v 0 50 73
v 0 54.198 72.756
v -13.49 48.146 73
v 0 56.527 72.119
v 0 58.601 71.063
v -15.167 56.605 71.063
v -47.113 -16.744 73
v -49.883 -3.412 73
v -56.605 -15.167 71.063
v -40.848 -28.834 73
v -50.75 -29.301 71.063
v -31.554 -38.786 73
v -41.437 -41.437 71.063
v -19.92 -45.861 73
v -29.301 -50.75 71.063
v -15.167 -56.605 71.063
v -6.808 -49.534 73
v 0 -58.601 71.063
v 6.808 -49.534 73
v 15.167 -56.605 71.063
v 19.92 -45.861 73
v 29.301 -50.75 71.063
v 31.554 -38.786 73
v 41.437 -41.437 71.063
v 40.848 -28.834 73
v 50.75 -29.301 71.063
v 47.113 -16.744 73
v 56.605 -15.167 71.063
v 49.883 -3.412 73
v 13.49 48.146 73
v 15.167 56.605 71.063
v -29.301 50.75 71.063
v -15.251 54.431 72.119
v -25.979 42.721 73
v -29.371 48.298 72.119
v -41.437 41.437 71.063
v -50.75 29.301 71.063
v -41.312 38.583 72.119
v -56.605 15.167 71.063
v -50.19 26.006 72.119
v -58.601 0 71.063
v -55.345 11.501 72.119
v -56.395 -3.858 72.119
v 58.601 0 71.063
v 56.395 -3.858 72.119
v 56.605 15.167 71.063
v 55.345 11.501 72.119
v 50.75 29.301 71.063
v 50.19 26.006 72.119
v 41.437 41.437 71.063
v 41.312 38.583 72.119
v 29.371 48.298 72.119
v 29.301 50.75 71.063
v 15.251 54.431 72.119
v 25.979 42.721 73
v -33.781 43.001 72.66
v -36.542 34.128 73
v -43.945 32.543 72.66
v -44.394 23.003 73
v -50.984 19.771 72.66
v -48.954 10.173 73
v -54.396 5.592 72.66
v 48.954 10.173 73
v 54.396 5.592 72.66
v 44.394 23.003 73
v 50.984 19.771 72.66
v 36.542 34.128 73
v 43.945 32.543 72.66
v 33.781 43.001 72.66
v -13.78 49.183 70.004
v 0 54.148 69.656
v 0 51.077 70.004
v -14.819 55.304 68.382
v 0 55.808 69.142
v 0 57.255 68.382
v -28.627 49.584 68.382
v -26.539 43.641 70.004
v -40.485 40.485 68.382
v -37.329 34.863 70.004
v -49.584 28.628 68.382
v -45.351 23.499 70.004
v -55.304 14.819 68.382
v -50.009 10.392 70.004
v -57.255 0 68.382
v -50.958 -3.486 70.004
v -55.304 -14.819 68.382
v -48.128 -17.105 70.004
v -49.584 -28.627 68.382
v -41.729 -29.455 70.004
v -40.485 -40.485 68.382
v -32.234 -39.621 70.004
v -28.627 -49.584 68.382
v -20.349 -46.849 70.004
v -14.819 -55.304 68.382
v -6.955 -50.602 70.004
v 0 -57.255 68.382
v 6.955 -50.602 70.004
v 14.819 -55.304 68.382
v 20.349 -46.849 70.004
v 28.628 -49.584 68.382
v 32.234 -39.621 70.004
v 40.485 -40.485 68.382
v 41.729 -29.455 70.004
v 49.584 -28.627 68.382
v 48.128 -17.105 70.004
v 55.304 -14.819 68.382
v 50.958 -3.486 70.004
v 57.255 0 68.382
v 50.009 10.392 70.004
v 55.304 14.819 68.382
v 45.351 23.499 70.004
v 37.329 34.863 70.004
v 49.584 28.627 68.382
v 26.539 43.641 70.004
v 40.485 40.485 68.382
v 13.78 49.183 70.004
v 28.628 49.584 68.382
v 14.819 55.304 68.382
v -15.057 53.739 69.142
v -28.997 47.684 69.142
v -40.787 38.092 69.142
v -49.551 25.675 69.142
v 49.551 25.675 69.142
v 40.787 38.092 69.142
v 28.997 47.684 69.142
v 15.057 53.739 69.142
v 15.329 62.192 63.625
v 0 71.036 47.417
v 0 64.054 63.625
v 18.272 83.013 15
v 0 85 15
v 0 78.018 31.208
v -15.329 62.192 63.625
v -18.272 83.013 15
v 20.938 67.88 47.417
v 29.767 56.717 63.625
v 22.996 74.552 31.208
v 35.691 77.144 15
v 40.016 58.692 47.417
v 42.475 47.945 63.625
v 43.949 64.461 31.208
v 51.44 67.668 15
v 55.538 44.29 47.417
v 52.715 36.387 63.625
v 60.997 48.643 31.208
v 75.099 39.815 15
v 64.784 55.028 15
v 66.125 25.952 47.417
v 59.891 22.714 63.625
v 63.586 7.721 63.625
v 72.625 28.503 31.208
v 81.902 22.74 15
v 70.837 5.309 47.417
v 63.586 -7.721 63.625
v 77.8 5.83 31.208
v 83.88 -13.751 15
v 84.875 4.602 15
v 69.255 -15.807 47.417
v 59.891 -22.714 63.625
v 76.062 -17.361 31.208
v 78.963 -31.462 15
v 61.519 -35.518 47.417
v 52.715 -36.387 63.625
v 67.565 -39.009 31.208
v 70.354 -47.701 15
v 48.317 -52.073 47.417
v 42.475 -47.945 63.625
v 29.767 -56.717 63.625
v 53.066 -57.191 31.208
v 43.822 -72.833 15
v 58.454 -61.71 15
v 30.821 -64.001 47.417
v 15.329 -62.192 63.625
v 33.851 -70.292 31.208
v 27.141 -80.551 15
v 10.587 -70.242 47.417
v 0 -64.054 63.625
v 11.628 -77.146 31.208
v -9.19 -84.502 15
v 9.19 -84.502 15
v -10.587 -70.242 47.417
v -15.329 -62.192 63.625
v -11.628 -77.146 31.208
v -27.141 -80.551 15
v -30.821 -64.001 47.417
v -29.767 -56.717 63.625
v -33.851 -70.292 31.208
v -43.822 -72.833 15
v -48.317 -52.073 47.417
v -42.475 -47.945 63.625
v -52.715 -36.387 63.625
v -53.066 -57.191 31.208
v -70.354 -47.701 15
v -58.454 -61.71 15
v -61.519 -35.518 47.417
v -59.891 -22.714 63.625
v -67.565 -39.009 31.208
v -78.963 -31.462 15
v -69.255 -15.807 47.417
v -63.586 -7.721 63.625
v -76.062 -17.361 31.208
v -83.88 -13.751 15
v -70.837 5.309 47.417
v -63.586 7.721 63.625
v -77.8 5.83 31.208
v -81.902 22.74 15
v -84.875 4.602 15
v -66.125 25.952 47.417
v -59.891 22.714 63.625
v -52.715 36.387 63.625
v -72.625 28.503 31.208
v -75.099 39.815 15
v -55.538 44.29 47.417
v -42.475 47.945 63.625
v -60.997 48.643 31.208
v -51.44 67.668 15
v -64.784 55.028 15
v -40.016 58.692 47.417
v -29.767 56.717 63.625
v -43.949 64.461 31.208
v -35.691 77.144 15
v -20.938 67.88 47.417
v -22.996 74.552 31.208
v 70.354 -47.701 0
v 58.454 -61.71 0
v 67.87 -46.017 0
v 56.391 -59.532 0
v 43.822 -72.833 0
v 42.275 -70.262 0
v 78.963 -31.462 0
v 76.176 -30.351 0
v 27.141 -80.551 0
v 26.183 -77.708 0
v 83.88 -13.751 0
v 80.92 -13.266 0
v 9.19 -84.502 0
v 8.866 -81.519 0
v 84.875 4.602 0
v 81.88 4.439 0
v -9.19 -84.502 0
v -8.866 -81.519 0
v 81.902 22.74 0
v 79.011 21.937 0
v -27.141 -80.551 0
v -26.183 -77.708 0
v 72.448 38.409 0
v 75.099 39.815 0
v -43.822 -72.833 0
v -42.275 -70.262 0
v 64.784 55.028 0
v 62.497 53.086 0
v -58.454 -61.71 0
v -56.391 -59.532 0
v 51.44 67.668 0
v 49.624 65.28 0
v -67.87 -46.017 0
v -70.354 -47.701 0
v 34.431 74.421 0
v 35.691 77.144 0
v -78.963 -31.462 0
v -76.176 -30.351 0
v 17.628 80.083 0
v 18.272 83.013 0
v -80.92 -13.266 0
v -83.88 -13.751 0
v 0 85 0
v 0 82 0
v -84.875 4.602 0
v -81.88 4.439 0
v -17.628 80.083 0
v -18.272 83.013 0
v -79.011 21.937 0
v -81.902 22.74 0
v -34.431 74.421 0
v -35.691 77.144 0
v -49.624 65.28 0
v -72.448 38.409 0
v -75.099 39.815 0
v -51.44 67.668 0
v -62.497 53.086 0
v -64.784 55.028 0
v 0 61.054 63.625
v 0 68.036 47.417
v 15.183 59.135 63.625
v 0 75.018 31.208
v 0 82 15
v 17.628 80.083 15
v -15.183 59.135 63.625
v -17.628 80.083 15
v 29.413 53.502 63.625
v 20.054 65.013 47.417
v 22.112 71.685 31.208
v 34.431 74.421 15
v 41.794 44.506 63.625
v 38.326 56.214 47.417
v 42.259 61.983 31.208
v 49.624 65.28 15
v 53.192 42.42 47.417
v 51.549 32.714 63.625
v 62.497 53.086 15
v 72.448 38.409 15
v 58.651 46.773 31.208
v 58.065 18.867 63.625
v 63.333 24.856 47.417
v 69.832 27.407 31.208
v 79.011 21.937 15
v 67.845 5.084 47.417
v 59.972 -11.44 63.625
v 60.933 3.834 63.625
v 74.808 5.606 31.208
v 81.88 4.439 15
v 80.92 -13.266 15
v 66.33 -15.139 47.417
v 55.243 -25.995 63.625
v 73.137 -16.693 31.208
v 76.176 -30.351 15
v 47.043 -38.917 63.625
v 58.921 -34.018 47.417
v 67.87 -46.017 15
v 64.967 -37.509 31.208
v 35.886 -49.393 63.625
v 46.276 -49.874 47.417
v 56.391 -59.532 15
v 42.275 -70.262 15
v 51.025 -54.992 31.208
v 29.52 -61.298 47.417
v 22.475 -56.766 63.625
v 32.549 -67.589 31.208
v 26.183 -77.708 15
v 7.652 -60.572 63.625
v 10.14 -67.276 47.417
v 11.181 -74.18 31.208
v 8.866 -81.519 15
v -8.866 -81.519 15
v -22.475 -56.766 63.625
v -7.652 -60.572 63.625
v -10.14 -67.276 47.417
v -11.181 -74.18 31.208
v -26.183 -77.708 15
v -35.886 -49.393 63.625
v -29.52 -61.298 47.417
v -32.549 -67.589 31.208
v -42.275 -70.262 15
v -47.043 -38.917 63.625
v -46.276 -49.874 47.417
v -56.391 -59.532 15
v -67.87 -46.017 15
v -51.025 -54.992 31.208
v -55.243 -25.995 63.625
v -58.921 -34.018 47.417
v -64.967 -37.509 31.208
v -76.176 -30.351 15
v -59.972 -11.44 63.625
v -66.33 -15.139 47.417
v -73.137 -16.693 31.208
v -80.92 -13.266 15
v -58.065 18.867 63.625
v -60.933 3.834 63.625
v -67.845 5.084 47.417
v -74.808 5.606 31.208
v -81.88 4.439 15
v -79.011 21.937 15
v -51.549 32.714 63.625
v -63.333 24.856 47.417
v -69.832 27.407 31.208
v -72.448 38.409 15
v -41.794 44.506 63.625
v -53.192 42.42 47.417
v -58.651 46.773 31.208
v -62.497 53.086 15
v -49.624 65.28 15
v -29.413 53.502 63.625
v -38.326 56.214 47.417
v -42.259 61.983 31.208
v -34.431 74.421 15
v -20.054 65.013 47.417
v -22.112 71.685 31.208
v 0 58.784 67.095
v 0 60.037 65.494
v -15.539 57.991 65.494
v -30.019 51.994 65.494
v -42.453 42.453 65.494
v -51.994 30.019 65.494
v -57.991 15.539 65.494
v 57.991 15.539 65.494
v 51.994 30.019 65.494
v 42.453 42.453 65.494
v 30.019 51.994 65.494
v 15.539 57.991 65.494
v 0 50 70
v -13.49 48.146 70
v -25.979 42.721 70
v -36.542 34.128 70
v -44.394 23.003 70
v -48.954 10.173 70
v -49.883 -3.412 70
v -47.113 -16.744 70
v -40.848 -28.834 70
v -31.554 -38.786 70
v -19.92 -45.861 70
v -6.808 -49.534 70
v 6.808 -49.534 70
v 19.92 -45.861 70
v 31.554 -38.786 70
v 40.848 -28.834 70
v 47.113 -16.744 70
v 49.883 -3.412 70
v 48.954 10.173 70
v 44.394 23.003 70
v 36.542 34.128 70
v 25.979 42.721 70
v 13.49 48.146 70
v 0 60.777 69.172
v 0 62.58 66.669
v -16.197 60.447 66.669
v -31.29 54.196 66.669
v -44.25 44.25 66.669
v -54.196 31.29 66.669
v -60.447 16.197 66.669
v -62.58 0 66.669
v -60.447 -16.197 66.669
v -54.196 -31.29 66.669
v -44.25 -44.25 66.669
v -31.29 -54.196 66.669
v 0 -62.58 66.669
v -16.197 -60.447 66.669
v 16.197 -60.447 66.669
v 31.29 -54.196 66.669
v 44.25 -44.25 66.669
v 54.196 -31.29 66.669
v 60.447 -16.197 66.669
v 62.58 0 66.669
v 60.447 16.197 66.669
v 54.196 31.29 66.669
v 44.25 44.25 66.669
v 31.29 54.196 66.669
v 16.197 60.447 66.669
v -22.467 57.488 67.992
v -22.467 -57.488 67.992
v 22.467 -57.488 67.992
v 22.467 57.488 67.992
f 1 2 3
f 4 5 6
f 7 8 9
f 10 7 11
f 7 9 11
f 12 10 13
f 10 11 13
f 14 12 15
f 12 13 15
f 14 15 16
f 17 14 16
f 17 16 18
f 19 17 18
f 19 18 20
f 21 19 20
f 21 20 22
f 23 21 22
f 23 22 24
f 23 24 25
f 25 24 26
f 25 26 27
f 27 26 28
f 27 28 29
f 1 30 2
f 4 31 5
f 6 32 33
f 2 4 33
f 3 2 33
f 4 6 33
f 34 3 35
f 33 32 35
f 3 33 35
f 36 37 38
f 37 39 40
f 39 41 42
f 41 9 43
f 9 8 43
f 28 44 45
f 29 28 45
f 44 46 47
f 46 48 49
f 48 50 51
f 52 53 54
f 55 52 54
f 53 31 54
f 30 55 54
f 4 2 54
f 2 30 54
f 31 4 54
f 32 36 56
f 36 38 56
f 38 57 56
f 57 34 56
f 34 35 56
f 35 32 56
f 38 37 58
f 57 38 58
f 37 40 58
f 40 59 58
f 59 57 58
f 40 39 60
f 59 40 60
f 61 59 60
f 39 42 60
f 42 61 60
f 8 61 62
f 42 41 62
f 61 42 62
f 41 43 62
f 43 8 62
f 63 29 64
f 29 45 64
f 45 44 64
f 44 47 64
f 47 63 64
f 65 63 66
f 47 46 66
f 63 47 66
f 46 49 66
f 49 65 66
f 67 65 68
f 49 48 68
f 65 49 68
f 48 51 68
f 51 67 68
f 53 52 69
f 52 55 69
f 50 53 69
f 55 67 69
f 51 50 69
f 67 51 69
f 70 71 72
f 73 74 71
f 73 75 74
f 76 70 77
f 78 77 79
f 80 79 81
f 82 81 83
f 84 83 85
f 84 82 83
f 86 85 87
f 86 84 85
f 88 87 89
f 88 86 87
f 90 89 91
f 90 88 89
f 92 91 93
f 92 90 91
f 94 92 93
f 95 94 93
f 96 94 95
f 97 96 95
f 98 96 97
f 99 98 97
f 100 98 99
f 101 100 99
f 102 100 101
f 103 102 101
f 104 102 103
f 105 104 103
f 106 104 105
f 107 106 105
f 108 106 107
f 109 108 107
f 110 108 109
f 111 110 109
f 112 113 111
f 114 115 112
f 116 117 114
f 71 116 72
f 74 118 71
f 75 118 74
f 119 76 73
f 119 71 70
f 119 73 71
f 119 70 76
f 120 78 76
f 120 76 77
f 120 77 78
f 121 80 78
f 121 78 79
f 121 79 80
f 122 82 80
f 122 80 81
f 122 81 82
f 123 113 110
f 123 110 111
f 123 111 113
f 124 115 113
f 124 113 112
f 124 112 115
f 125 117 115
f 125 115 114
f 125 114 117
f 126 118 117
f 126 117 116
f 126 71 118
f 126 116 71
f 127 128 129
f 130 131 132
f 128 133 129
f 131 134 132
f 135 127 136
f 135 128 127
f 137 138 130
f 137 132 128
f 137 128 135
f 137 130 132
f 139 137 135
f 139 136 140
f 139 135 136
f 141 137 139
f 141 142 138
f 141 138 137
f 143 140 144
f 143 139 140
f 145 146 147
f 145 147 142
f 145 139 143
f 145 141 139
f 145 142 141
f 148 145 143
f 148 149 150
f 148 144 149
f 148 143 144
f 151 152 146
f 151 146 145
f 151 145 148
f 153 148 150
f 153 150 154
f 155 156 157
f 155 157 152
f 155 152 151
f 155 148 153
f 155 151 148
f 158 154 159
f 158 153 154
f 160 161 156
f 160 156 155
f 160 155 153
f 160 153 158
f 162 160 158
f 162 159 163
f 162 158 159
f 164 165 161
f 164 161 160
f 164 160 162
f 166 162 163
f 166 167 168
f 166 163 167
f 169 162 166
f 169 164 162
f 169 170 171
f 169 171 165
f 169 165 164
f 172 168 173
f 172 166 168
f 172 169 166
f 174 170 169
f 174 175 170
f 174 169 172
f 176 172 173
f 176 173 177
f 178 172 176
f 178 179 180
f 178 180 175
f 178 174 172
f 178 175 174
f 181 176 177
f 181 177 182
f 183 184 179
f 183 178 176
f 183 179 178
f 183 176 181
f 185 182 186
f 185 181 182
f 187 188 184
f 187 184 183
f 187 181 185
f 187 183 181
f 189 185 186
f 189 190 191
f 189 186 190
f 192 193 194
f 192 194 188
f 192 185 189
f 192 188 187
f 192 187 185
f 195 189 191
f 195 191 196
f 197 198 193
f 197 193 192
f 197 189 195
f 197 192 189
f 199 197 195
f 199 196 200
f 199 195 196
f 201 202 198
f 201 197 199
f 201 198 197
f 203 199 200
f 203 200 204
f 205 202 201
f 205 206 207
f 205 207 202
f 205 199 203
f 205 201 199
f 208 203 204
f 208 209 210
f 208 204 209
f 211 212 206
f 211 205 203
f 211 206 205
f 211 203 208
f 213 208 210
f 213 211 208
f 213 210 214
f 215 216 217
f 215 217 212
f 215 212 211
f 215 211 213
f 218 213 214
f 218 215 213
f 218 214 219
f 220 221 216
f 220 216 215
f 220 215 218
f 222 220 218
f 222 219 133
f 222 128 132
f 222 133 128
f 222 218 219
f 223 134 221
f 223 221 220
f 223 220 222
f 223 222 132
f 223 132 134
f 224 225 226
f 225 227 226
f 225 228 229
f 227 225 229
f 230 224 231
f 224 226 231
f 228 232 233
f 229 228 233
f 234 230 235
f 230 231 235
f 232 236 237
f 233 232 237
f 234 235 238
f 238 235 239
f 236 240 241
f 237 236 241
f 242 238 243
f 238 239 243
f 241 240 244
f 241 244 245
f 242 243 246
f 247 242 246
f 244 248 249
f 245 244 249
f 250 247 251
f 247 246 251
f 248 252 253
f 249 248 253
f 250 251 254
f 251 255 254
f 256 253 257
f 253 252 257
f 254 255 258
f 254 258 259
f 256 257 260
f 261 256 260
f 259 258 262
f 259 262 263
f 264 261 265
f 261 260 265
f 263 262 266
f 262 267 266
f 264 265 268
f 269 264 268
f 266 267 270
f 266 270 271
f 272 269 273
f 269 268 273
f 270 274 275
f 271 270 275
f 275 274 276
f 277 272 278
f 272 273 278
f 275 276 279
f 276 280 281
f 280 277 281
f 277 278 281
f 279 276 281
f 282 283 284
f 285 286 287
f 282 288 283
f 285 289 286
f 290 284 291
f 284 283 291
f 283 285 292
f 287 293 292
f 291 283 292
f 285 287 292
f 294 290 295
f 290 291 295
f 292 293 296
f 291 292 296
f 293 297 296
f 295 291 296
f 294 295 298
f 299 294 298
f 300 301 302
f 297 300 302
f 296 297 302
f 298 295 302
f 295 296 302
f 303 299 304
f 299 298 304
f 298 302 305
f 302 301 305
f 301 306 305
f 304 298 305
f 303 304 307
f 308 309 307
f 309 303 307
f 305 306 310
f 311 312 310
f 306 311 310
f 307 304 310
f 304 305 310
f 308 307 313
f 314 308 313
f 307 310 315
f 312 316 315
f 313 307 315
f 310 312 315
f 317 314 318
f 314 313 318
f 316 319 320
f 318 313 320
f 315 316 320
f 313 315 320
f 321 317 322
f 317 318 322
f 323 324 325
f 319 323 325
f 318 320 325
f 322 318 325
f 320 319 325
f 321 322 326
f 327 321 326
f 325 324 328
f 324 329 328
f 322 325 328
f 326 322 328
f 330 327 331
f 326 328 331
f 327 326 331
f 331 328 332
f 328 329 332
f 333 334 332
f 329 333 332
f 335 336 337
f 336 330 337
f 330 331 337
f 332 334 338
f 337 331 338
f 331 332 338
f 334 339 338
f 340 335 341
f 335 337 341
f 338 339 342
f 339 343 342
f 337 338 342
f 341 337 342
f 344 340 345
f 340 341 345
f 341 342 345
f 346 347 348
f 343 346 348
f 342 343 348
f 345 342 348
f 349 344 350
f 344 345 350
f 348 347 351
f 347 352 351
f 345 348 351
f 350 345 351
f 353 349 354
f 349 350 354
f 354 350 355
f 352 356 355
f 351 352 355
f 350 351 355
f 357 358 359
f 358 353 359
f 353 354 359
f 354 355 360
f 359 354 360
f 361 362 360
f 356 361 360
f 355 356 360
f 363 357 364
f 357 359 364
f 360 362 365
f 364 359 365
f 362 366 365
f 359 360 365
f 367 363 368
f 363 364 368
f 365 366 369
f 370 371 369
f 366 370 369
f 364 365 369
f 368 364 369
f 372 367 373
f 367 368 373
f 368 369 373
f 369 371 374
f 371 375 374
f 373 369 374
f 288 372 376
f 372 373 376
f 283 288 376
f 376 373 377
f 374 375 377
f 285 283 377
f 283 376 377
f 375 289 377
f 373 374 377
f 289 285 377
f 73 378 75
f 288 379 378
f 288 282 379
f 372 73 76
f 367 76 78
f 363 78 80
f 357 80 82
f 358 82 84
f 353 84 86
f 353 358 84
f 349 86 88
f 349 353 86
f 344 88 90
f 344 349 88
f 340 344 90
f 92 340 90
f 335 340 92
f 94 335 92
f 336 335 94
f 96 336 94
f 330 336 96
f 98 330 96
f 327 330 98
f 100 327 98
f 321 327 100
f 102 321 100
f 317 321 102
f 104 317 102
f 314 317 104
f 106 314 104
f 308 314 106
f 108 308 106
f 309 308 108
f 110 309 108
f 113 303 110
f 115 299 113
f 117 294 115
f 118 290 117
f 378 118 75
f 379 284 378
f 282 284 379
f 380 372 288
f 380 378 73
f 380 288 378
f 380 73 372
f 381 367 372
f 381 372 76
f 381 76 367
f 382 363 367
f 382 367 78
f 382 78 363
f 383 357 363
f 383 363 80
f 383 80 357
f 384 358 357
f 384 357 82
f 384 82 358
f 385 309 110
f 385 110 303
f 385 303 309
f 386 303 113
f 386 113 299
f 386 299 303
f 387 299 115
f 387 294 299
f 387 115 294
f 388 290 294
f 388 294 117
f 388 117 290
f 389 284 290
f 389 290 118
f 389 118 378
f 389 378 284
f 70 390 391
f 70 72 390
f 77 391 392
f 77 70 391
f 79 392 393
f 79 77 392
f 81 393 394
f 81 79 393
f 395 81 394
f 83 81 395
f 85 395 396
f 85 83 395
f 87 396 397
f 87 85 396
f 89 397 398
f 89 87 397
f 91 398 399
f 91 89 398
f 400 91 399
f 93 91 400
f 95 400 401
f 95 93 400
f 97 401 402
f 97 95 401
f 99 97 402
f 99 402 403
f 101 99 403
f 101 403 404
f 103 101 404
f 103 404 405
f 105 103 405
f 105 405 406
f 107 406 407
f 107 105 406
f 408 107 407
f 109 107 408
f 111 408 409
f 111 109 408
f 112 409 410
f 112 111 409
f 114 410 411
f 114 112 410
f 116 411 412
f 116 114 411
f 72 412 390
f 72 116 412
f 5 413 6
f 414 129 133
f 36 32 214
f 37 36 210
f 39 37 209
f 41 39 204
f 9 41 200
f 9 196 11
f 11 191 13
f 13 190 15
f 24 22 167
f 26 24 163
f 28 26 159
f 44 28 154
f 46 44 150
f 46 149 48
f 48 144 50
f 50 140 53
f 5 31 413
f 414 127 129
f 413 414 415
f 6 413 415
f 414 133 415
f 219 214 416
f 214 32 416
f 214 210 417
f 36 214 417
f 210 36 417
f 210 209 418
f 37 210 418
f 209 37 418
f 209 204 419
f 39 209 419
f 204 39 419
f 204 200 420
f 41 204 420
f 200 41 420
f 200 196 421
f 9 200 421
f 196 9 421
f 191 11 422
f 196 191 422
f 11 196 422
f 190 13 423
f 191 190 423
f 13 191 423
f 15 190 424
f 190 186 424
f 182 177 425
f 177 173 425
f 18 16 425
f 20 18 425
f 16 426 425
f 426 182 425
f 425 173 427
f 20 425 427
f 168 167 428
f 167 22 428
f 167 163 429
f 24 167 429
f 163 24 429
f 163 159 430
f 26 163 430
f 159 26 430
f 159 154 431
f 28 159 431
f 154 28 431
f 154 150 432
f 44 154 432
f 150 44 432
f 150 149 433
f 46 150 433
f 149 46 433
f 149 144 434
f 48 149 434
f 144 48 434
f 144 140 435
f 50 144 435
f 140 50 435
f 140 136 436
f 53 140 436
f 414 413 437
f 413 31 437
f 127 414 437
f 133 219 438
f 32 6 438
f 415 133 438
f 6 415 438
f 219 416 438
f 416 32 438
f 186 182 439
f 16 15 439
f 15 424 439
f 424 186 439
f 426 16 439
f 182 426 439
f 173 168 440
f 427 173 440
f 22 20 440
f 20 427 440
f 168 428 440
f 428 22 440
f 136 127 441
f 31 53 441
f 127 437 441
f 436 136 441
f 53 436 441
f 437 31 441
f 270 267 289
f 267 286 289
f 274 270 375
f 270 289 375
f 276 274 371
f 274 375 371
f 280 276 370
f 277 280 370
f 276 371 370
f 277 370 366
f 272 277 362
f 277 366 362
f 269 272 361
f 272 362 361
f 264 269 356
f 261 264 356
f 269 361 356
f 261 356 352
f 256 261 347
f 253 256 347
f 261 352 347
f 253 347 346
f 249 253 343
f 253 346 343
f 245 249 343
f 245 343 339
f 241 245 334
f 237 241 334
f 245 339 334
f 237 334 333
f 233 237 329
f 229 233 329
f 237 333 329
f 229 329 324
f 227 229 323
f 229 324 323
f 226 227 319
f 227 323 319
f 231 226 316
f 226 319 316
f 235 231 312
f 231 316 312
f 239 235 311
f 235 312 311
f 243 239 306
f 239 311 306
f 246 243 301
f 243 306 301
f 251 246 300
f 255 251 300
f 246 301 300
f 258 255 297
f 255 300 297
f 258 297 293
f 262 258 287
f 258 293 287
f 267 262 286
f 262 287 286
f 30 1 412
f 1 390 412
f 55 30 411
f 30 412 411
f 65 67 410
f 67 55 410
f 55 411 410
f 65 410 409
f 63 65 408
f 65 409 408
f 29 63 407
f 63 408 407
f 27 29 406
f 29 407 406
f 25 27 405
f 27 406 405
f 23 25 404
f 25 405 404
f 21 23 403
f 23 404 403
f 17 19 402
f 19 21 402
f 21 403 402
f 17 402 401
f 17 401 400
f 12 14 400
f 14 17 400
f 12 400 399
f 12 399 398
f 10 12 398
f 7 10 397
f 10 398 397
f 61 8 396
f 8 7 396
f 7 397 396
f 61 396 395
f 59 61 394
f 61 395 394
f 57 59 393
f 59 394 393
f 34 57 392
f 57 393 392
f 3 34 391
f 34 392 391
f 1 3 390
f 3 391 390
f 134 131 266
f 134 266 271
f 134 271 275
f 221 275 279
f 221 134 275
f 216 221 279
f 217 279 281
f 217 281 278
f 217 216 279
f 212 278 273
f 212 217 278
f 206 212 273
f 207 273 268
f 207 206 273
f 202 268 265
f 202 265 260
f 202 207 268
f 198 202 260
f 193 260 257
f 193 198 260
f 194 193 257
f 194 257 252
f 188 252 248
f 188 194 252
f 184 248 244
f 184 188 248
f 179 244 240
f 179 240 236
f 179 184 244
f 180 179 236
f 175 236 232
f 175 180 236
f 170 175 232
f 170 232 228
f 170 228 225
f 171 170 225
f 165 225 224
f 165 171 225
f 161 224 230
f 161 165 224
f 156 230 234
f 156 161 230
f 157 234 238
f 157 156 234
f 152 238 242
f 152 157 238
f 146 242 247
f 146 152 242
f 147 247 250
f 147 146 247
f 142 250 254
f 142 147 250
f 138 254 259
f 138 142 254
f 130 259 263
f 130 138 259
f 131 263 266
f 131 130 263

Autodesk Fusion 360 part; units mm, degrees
sketch "Sketch1" plane through (0, 0, 0) normal (1, 0, 0) x (0, 1, 0)
  line L0 (85, 0) -> (85, 15)
  line L1 (85, 0) -> (82, 0)
  line L2 (82, 0) -> (82, 15)
  line L3 (0, 0) -> (0, 73)
  line L4 (50, 73) -> (50, 70)
  spline S0 degree 5 poles (50, 73) (50.4063, 73.0182) (51.2078, 73.0367) (52.3772, 73.0101) (53.8693, 72.8647) (55.6153, 72.487) (57.2317, 71.8962) (58.708, 71.0754) (60.0393, 70.0162) (61.2318, 68.7289) (62.2962, 67.2311) (63.0538, 65.8786) (63.5726, 64.7829) (63.8968, 64.0169) (64.0535, 63.625) knots 0 0 0 0 0 0 0.1 0.2 0.3 0.4 0.5 0.6 0.7 0.8 0.9 1 1 1 1 1 1
  line L5 (61.0535, 63.625) -> (82, 15)
  line L6 (51.9575, 70.0067) -> (50, 70)
  spline S1 degree 5 poles (50, 70) (50.3403, 70.0094) (51.0099, 70.0155) (51.9809, 69.9862) (53.2081, 69.8693) (54.6224, 69.5851) (55.9083, 69.1531) (57.0588, 68.5656) (58.0757, 67.825) (58.9739, 66.9493) (59.7664, 65.9537) (60.3249, 65.0717) (60.7043, 64.3654) (60.94, 63.8751) (61.0535, 63.625) knots 0 0 0 0 0 0 0.1 0.2 0.3 0.4 0.5 0.6 0.7 0.8 0.9 1 1 1 1 1 1
  line L7 (58.6014, 71.0627) -> (57.255, 68.3818)
  line L8 (55.9864, 69.2167) -> (58.5237, 67.5469)
  line L9 (64.0535, 63.625) -> (85, 15)
  line L10 (61.0535, 63.625) -> (64.0535, 63.625)
  point P0 (58.6014, 71.0627)
  point P1 (57.255, 68.3818)
  dimension "d21" = 3
  dimension "d23" = 15
  dimension "d24" = 85
  dimension "d38" = 73
  dimension "d41" = 3
  dimension "d46" = 3
  dimension "d48" = 3
sketch "Sketch2" plane through (0, 0, 0) normal (0, 0, 1) x (1, 0, 0)
revolve "Revolve3" add sketch "Sketch1" angle 360 about axis through (0, 0, 0) along (0, 0, 1)
